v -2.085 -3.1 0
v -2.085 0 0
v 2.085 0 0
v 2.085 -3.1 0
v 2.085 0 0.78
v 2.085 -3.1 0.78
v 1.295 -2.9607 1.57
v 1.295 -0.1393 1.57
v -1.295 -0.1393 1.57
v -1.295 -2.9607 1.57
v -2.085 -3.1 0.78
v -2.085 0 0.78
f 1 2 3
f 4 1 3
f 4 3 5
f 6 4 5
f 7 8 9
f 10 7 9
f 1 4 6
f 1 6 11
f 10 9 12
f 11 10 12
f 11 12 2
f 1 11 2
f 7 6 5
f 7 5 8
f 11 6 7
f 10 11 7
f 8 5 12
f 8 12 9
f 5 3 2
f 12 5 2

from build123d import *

# Parameters (mm, degrees)
BOSS_EXTRUDE1_DEPTH = 3.1
CUT_EXTRUDE1_DEPTH  = 6.428056743


with BuildPart() as part:
    # Sketch2 → Boss-Extrude1 (new body)
    with BuildSketch(Plane(origin=(0, 0, 0), x_dir=(1, 0, 0), z_dir=(0, 1, 0))):
        Polygon((-2.085, 0), (2.085, 0), (2.085, -0.78), (1.295, -1.57), (-1.295, -1.57), (-2.085, -0.78), align=None)
    extrude(amount=-BOSS_EXTRUDE1_DEPTH)

    # Sketch4 → Cut-Extrude1 (cut, through all)
    with BuildSketch(Plane(origin=(2.085, 0, 0), x_dir=(0, 0, -1), z_dir=(1, 0, 0))):
        Polygon((-0.78, 0), (-2.734960496, -0.344712282), (-2.734960496, 0), align=None)
        Polygon((-0.78, -3.1), (-2.582357752, -2.782195699), (-2.582357752, -3.1), align=None)
    extrude(amount=-CUT_EXTRUDE1_DEPTH, mode=Mode.SUBTRACT)


solid = part.part
